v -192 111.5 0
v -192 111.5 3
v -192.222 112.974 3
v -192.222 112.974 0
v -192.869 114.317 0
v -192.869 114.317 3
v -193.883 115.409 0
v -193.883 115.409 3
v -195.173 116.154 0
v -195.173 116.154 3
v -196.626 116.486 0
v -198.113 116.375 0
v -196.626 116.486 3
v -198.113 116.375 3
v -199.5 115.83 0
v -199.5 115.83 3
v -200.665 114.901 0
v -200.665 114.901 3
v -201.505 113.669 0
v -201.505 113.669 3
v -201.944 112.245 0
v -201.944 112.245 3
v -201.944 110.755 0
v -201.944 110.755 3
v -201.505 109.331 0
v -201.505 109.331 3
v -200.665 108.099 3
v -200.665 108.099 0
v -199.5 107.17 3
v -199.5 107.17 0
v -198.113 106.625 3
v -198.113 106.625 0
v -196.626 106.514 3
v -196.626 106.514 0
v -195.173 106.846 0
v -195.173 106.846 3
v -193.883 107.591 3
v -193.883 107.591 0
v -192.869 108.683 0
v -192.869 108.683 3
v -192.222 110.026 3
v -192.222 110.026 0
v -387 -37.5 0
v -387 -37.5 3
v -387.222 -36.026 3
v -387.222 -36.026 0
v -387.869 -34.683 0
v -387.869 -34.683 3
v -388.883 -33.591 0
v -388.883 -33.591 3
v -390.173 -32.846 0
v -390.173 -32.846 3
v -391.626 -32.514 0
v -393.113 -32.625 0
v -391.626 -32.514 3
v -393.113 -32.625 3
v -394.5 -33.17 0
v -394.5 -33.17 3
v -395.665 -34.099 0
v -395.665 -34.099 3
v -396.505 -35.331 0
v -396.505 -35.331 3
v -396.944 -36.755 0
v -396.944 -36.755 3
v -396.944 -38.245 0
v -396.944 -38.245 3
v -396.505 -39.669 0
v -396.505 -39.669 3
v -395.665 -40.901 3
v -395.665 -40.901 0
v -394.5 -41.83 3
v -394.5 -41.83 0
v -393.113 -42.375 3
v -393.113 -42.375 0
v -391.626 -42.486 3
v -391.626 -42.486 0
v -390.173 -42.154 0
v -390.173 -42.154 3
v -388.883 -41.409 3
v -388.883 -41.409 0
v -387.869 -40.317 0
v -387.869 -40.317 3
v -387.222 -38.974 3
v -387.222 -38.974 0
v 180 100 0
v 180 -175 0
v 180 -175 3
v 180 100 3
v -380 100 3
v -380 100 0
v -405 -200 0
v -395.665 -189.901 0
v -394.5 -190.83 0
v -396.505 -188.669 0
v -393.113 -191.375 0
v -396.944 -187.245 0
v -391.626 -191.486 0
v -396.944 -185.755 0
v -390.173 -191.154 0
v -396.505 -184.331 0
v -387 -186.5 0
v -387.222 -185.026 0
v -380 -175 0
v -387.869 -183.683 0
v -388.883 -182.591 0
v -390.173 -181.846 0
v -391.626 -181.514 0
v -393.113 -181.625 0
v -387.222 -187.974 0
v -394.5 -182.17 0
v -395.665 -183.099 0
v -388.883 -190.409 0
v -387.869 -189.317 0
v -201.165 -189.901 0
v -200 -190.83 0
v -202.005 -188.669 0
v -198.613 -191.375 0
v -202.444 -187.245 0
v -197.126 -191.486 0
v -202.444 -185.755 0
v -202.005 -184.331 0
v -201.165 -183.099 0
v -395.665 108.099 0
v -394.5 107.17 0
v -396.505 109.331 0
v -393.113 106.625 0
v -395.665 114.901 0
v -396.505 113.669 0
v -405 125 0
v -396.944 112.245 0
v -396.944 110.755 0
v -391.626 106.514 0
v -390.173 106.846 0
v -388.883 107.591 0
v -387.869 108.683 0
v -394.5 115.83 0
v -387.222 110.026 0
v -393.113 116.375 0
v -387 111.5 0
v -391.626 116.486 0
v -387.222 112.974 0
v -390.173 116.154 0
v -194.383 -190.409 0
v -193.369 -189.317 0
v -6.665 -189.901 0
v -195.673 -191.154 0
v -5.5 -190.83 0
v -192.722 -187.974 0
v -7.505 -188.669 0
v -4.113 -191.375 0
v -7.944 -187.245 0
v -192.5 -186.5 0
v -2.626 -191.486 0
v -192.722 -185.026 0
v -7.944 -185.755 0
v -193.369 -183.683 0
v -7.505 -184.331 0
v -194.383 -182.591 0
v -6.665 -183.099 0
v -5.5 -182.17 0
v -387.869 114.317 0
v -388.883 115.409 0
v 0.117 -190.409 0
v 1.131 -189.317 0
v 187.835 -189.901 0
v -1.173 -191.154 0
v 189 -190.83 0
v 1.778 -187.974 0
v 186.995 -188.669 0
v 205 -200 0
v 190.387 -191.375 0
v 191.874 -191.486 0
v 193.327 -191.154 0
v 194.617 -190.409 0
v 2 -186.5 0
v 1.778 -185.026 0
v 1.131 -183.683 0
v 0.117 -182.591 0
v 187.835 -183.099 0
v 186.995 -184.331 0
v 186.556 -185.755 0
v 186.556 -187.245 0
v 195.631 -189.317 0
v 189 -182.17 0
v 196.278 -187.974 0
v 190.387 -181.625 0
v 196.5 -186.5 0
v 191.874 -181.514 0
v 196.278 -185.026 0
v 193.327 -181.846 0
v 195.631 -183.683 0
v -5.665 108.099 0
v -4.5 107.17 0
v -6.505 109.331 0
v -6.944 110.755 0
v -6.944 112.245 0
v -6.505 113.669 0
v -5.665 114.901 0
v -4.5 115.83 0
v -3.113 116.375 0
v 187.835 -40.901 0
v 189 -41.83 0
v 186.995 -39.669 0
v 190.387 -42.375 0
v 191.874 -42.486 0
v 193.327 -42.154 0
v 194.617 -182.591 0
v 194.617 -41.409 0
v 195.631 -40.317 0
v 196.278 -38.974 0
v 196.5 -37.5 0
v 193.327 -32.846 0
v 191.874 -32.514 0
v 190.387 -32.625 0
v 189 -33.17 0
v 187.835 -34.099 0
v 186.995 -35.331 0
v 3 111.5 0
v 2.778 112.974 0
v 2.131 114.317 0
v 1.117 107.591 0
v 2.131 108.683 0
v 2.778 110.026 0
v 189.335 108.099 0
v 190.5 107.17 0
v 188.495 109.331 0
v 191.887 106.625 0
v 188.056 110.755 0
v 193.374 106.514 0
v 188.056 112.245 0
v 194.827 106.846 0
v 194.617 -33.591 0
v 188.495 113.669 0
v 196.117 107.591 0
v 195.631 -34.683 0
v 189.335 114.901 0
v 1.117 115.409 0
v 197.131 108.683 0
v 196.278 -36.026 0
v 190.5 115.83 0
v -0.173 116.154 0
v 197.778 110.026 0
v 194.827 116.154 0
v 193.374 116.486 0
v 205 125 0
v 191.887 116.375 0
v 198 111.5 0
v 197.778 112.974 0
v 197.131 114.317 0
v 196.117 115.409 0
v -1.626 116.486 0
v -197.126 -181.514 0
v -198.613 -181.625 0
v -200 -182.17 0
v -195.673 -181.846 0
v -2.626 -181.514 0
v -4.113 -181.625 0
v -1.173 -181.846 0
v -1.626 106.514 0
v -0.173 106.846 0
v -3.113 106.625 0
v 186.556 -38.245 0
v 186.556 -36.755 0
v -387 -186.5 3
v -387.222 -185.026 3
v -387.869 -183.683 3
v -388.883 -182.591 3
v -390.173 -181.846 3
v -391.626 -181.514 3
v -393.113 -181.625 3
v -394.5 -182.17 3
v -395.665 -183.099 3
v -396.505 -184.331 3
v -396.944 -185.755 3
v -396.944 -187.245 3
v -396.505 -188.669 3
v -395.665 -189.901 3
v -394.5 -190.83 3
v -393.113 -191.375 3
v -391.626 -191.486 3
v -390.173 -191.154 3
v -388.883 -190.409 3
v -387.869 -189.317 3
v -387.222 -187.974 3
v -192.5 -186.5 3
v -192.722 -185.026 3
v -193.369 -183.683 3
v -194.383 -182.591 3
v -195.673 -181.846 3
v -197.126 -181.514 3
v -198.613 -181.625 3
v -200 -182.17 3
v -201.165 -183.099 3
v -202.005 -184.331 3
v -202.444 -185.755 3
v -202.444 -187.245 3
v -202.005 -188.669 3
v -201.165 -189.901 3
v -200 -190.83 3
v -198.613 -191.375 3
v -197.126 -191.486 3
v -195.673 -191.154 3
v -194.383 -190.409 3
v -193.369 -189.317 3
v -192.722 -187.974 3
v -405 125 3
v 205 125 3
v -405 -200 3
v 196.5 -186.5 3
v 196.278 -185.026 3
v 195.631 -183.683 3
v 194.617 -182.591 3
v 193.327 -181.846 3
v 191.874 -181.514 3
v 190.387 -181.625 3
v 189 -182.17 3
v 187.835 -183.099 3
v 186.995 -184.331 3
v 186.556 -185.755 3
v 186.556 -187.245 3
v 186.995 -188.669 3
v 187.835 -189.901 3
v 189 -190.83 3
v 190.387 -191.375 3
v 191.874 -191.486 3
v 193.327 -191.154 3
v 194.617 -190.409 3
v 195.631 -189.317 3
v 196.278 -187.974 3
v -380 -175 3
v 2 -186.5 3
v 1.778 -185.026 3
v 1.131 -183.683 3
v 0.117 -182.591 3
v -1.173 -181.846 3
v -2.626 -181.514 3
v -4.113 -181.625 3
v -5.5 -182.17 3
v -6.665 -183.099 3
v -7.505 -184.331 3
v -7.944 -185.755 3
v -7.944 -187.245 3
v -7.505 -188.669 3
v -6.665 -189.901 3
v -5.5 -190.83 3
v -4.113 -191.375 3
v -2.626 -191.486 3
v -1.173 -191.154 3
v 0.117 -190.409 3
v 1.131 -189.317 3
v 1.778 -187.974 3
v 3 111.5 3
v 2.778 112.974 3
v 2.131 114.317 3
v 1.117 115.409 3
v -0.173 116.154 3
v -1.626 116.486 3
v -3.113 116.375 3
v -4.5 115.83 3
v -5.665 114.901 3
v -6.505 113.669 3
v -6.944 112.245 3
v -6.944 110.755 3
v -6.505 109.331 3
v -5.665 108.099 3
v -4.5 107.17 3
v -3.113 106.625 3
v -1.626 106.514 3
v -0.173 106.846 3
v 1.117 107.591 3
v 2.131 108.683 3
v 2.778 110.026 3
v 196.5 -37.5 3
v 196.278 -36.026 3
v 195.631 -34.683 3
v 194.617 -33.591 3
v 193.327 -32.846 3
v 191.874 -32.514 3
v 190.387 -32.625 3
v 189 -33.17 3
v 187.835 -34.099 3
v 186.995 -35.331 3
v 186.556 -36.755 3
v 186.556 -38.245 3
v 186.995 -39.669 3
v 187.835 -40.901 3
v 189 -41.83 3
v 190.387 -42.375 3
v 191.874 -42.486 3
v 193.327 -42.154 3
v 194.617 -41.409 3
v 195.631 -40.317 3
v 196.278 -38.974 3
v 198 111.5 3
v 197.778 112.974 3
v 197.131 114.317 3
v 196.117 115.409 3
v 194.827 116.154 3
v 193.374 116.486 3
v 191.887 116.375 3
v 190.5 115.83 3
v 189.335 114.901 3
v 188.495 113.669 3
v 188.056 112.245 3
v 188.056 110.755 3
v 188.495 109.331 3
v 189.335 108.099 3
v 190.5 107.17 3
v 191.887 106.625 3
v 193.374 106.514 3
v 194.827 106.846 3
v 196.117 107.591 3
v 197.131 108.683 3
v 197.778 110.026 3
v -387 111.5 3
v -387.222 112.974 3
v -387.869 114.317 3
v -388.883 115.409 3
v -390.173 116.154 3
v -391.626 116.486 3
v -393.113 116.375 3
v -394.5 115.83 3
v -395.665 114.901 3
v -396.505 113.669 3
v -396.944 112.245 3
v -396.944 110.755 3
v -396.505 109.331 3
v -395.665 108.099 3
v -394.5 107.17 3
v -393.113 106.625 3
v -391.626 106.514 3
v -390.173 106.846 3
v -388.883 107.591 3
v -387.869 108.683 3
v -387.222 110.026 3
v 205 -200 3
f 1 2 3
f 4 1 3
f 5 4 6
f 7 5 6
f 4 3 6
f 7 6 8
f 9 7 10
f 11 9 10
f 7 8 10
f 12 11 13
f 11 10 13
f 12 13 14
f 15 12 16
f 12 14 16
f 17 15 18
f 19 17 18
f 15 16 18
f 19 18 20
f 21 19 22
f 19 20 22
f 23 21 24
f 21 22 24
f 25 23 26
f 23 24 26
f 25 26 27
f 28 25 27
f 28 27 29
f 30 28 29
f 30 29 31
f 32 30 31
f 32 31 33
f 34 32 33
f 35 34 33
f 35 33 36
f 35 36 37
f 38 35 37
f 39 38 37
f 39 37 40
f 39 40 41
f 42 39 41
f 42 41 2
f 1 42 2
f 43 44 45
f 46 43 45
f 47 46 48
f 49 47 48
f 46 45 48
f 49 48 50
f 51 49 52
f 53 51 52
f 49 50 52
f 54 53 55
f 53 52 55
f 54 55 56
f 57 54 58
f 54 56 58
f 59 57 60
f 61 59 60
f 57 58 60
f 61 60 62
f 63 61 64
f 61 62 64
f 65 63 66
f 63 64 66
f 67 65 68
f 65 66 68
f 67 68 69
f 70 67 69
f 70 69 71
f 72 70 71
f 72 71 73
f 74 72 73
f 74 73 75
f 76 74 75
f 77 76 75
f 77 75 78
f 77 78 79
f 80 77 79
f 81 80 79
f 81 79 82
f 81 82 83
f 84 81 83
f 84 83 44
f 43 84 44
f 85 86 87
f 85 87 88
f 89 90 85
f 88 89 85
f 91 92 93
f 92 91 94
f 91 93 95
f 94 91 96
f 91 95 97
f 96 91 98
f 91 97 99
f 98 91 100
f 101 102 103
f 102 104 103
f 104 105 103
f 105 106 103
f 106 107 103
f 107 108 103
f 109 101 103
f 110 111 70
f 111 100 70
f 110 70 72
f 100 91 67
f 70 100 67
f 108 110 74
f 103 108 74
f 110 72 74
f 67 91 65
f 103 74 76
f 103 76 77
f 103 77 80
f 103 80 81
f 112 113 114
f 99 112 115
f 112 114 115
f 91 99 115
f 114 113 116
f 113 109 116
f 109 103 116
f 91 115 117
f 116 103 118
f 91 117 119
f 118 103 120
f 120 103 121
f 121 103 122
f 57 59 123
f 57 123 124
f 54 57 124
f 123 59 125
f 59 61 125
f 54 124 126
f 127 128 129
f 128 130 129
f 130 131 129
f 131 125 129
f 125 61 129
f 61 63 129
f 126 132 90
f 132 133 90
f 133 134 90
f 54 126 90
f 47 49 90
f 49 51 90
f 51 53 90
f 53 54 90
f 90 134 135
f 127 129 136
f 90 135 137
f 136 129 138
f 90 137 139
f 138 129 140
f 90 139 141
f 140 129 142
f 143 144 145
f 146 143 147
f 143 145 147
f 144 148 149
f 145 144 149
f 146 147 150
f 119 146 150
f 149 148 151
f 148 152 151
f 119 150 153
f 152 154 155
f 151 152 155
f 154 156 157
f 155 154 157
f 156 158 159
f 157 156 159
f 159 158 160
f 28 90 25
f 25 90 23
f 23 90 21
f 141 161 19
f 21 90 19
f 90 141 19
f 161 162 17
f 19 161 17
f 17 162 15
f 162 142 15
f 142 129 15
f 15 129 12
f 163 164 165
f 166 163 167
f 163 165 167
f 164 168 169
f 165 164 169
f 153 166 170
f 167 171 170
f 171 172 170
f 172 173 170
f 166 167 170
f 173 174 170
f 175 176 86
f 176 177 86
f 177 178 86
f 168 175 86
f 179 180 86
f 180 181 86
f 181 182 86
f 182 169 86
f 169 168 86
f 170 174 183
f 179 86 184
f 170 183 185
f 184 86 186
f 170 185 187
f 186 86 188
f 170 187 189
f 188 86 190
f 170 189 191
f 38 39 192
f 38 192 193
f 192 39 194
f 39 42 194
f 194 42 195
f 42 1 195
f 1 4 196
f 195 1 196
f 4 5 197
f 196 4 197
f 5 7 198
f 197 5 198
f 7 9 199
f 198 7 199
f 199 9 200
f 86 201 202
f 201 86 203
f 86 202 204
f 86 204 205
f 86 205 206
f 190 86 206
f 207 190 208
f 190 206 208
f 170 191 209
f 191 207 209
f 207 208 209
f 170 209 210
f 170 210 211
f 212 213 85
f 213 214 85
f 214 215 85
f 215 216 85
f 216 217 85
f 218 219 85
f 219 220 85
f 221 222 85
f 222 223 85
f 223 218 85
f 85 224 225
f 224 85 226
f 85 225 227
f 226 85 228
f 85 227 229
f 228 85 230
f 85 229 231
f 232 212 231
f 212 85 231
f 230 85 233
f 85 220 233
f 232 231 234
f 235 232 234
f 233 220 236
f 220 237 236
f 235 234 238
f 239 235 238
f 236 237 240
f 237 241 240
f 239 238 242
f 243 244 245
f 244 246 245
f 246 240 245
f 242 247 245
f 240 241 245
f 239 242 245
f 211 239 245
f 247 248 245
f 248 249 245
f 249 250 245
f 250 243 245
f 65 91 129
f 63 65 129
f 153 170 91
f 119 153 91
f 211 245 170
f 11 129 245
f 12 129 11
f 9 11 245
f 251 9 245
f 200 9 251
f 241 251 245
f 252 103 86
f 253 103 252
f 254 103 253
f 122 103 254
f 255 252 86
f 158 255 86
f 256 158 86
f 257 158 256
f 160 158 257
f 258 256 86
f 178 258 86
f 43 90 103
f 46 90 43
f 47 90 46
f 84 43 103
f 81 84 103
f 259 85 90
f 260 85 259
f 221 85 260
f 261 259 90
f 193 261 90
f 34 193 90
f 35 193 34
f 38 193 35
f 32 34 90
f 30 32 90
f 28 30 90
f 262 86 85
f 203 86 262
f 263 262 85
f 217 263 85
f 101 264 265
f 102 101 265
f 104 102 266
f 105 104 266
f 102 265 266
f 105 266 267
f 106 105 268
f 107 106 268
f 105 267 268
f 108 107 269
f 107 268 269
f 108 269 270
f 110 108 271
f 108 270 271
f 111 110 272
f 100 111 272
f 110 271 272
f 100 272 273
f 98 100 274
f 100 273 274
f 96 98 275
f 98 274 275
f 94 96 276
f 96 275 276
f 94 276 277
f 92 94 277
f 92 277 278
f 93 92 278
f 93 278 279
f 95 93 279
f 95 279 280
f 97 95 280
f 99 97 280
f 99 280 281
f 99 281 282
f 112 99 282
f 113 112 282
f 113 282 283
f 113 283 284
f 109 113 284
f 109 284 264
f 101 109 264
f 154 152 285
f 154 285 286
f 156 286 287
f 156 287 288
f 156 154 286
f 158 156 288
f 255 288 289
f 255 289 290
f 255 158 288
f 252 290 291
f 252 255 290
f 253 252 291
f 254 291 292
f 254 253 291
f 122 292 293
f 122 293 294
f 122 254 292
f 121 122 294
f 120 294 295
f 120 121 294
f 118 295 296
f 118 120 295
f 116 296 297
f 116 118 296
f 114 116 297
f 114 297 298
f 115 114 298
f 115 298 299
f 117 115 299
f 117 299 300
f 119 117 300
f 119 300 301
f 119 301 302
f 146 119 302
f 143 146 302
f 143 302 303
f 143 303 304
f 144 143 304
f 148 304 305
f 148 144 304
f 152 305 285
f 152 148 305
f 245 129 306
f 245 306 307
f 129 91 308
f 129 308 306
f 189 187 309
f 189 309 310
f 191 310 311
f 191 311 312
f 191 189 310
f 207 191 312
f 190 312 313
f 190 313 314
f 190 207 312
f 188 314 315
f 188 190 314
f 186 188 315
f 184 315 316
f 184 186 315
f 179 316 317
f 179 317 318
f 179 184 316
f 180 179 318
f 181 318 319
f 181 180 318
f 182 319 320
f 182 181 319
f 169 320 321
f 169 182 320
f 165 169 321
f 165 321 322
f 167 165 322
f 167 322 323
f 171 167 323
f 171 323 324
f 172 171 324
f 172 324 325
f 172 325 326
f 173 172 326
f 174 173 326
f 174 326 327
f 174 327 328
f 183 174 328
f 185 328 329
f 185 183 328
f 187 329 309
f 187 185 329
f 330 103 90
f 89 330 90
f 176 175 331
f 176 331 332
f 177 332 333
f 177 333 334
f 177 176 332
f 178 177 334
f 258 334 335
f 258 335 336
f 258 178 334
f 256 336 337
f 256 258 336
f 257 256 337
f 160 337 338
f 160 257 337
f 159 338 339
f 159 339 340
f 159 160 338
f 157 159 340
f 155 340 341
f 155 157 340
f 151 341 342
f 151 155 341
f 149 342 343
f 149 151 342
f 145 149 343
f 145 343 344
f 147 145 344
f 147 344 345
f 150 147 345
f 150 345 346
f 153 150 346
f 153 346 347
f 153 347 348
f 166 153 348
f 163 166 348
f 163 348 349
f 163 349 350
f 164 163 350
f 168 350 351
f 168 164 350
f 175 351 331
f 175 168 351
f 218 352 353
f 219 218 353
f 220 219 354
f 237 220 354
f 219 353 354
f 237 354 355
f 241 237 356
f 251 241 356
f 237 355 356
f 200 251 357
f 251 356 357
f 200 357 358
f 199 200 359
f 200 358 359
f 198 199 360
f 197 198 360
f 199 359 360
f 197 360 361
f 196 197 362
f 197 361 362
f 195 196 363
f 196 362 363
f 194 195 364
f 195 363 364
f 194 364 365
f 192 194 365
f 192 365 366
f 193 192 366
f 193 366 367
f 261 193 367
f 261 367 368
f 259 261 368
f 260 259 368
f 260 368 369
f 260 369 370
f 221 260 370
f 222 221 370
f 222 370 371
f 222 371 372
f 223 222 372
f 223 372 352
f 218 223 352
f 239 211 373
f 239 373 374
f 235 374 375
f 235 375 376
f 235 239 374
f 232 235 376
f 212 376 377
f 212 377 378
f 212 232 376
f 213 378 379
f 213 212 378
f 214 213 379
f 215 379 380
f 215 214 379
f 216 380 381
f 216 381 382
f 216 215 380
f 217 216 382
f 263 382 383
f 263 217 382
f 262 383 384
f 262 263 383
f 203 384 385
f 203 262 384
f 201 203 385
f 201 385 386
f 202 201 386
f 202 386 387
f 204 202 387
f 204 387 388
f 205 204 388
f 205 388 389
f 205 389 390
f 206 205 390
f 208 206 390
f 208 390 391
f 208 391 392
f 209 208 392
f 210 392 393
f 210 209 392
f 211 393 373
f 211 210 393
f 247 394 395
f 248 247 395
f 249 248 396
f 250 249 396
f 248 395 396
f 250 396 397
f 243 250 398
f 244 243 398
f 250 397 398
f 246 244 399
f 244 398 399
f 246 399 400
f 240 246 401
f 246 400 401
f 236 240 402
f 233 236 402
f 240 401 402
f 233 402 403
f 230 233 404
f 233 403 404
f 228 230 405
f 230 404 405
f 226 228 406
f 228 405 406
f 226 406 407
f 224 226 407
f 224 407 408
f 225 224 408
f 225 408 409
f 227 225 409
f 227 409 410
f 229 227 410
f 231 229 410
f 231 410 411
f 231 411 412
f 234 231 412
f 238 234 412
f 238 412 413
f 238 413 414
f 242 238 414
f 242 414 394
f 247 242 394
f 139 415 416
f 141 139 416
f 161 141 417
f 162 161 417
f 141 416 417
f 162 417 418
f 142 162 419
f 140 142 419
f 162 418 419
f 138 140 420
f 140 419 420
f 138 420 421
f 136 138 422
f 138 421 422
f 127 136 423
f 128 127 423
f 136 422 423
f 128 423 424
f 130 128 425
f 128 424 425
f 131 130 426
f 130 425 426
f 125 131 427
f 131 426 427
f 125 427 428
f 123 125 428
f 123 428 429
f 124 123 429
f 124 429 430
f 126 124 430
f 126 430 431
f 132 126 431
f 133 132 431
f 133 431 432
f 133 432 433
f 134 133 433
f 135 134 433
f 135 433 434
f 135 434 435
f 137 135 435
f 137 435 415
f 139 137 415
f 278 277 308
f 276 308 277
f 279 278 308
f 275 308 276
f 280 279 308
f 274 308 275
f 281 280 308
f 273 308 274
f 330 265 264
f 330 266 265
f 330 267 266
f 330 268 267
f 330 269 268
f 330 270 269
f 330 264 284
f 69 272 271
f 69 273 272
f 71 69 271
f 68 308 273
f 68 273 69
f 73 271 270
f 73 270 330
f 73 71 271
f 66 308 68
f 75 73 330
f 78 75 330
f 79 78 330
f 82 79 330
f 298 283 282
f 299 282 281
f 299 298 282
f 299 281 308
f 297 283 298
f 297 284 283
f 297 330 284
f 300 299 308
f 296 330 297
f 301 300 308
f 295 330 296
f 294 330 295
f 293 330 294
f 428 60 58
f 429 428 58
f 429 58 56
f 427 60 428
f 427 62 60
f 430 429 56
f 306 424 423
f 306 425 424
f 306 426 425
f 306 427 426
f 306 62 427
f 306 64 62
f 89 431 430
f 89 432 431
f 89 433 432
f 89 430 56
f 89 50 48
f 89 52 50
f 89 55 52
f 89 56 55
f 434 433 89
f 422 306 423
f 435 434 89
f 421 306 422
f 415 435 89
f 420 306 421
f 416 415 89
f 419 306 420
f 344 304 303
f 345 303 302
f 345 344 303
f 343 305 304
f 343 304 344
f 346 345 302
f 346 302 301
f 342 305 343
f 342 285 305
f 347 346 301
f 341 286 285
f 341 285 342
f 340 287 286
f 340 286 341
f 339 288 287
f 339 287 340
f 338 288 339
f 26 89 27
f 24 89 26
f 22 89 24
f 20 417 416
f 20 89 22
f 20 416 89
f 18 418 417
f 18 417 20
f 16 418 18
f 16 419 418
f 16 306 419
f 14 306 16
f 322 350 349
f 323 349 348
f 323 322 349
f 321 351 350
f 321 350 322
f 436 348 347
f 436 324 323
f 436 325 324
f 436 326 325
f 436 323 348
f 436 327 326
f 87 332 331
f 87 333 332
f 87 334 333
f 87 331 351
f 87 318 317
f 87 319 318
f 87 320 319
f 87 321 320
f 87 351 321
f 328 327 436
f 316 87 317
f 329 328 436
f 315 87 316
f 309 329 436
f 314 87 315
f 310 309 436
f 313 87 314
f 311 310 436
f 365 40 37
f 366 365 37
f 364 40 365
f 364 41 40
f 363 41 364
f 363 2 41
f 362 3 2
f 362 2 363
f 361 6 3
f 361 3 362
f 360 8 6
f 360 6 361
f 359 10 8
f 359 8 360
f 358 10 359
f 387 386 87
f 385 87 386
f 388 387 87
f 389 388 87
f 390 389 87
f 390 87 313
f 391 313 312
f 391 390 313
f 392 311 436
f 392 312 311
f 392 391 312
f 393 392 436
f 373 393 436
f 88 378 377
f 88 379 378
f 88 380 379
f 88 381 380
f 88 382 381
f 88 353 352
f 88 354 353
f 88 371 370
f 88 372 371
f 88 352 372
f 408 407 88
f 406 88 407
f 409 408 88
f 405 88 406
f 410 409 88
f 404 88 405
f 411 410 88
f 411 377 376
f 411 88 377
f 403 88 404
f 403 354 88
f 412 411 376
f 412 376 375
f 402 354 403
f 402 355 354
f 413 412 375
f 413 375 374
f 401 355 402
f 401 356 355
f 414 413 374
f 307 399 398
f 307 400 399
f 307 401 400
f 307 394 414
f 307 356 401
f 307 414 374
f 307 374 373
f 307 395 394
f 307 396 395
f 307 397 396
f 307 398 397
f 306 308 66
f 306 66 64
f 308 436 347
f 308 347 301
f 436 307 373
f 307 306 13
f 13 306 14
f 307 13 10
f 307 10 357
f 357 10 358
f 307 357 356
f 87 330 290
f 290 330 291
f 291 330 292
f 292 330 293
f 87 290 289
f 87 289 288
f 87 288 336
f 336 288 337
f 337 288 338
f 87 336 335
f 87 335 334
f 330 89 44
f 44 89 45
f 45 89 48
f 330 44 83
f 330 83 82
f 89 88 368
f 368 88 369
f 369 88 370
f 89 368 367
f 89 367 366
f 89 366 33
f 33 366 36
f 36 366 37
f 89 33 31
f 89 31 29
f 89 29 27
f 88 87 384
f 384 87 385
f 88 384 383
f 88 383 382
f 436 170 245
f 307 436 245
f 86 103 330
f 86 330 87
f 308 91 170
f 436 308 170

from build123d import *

# Parameters (mm, degrees)
SKETCH1_W           = 610
SKETCH1_H           = 325
SKETCH1_W_2         = 560
SKETCH1_H_2         = 275
BOSS_EXTRUDE1_DEPTH = 3
SKETCH2_R           = 5
CUT_EXTRUDE1_DEPTH  = 4
LPATTERN1_COUNT     = 4
LPATTERN1_PITCH     = 195
LPATTERN2_COUNT     = 3
LPATTERN2_PITCH     = 149
LPATTERN3_OUTLINE_R = 5
LPATTERN3_DEPTH     = 3
LPATTERN4_OUTLINE_R = 5
LPATTERN4_DEPTH     = 3


# Read off the part's stored shape, not the designer's step: LPattern3, LPattern4
with BuildPart() as part:
    # Sketch1 → Boss-Extrude1 (new body)
    with BuildSketch(Plane.XY):
        with Locations((-100, -37.5)):
            Rectangle(SKETCH1_W, SKETCH1_H)
        with Locations((-100, -37.5)):
            Rectangle(SKETCH1_W_2, SKETCH1_H_2, mode=Mode.SUBTRACT)
    extrude(amount=BOSS_EXTRUDE1_DEPTH)

    # Sketch2 → Cut-Extrude1 (cut)
    with BuildSketch(Plane.XY.offset(3)):
        with Locations((-392, 111.5)):
            Circle(SKETCH2_R)
    cut_extrude1 = extrude(amount=-CUT_EXTRUDE1_DEPTH, mode=Mode.SUBTRACT)

    # LPattern1: Cut-Extrude1 ×4
    with Locations(*[(i * LPATTERN1_PITCH, 0, 0) for i in range(1, LPATTERN1_COUNT)]):
        add(cut_extrude1, mode=Mode.SUBTRACT)

    # LPattern2: Cut-Extrude1 ×3
    with Locations(*[(0, -i * LPATTERN2_PITCH, 0) for i in range(1, LPATTERN2_COUNT)]):
        add(cut_extrude1, mode=Mode.SUBTRACT)

    # LPattern3 outline → LPattern3 (cut)
    with BuildSketch(Plane.XY):
        with Locations((191.5, -186.5)):
            Circle(LPATTERN3_OUTLINE_R)
        with Locations((-3, -186.5)):
            Circle(LPATTERN3_OUTLINE_R)
        with Locations((-197.5, -186.5)):
            Circle(LPATTERN3_OUTLINE_R)
    extrude(amount=LPATTERN3_DEPTH, mode=Mode.SUBTRACT)

    # LPattern4 outline → LPattern4 (cut)
    with BuildSketch(Plane.XY):
        with Locations((191.5, -37.5)):
            Circle(LPATTERN4_OUTLINE_R)
    extrude(amount=LPATTERN4_DEPTH, mode=Mode.SUBTRACT)


solid = part.part
